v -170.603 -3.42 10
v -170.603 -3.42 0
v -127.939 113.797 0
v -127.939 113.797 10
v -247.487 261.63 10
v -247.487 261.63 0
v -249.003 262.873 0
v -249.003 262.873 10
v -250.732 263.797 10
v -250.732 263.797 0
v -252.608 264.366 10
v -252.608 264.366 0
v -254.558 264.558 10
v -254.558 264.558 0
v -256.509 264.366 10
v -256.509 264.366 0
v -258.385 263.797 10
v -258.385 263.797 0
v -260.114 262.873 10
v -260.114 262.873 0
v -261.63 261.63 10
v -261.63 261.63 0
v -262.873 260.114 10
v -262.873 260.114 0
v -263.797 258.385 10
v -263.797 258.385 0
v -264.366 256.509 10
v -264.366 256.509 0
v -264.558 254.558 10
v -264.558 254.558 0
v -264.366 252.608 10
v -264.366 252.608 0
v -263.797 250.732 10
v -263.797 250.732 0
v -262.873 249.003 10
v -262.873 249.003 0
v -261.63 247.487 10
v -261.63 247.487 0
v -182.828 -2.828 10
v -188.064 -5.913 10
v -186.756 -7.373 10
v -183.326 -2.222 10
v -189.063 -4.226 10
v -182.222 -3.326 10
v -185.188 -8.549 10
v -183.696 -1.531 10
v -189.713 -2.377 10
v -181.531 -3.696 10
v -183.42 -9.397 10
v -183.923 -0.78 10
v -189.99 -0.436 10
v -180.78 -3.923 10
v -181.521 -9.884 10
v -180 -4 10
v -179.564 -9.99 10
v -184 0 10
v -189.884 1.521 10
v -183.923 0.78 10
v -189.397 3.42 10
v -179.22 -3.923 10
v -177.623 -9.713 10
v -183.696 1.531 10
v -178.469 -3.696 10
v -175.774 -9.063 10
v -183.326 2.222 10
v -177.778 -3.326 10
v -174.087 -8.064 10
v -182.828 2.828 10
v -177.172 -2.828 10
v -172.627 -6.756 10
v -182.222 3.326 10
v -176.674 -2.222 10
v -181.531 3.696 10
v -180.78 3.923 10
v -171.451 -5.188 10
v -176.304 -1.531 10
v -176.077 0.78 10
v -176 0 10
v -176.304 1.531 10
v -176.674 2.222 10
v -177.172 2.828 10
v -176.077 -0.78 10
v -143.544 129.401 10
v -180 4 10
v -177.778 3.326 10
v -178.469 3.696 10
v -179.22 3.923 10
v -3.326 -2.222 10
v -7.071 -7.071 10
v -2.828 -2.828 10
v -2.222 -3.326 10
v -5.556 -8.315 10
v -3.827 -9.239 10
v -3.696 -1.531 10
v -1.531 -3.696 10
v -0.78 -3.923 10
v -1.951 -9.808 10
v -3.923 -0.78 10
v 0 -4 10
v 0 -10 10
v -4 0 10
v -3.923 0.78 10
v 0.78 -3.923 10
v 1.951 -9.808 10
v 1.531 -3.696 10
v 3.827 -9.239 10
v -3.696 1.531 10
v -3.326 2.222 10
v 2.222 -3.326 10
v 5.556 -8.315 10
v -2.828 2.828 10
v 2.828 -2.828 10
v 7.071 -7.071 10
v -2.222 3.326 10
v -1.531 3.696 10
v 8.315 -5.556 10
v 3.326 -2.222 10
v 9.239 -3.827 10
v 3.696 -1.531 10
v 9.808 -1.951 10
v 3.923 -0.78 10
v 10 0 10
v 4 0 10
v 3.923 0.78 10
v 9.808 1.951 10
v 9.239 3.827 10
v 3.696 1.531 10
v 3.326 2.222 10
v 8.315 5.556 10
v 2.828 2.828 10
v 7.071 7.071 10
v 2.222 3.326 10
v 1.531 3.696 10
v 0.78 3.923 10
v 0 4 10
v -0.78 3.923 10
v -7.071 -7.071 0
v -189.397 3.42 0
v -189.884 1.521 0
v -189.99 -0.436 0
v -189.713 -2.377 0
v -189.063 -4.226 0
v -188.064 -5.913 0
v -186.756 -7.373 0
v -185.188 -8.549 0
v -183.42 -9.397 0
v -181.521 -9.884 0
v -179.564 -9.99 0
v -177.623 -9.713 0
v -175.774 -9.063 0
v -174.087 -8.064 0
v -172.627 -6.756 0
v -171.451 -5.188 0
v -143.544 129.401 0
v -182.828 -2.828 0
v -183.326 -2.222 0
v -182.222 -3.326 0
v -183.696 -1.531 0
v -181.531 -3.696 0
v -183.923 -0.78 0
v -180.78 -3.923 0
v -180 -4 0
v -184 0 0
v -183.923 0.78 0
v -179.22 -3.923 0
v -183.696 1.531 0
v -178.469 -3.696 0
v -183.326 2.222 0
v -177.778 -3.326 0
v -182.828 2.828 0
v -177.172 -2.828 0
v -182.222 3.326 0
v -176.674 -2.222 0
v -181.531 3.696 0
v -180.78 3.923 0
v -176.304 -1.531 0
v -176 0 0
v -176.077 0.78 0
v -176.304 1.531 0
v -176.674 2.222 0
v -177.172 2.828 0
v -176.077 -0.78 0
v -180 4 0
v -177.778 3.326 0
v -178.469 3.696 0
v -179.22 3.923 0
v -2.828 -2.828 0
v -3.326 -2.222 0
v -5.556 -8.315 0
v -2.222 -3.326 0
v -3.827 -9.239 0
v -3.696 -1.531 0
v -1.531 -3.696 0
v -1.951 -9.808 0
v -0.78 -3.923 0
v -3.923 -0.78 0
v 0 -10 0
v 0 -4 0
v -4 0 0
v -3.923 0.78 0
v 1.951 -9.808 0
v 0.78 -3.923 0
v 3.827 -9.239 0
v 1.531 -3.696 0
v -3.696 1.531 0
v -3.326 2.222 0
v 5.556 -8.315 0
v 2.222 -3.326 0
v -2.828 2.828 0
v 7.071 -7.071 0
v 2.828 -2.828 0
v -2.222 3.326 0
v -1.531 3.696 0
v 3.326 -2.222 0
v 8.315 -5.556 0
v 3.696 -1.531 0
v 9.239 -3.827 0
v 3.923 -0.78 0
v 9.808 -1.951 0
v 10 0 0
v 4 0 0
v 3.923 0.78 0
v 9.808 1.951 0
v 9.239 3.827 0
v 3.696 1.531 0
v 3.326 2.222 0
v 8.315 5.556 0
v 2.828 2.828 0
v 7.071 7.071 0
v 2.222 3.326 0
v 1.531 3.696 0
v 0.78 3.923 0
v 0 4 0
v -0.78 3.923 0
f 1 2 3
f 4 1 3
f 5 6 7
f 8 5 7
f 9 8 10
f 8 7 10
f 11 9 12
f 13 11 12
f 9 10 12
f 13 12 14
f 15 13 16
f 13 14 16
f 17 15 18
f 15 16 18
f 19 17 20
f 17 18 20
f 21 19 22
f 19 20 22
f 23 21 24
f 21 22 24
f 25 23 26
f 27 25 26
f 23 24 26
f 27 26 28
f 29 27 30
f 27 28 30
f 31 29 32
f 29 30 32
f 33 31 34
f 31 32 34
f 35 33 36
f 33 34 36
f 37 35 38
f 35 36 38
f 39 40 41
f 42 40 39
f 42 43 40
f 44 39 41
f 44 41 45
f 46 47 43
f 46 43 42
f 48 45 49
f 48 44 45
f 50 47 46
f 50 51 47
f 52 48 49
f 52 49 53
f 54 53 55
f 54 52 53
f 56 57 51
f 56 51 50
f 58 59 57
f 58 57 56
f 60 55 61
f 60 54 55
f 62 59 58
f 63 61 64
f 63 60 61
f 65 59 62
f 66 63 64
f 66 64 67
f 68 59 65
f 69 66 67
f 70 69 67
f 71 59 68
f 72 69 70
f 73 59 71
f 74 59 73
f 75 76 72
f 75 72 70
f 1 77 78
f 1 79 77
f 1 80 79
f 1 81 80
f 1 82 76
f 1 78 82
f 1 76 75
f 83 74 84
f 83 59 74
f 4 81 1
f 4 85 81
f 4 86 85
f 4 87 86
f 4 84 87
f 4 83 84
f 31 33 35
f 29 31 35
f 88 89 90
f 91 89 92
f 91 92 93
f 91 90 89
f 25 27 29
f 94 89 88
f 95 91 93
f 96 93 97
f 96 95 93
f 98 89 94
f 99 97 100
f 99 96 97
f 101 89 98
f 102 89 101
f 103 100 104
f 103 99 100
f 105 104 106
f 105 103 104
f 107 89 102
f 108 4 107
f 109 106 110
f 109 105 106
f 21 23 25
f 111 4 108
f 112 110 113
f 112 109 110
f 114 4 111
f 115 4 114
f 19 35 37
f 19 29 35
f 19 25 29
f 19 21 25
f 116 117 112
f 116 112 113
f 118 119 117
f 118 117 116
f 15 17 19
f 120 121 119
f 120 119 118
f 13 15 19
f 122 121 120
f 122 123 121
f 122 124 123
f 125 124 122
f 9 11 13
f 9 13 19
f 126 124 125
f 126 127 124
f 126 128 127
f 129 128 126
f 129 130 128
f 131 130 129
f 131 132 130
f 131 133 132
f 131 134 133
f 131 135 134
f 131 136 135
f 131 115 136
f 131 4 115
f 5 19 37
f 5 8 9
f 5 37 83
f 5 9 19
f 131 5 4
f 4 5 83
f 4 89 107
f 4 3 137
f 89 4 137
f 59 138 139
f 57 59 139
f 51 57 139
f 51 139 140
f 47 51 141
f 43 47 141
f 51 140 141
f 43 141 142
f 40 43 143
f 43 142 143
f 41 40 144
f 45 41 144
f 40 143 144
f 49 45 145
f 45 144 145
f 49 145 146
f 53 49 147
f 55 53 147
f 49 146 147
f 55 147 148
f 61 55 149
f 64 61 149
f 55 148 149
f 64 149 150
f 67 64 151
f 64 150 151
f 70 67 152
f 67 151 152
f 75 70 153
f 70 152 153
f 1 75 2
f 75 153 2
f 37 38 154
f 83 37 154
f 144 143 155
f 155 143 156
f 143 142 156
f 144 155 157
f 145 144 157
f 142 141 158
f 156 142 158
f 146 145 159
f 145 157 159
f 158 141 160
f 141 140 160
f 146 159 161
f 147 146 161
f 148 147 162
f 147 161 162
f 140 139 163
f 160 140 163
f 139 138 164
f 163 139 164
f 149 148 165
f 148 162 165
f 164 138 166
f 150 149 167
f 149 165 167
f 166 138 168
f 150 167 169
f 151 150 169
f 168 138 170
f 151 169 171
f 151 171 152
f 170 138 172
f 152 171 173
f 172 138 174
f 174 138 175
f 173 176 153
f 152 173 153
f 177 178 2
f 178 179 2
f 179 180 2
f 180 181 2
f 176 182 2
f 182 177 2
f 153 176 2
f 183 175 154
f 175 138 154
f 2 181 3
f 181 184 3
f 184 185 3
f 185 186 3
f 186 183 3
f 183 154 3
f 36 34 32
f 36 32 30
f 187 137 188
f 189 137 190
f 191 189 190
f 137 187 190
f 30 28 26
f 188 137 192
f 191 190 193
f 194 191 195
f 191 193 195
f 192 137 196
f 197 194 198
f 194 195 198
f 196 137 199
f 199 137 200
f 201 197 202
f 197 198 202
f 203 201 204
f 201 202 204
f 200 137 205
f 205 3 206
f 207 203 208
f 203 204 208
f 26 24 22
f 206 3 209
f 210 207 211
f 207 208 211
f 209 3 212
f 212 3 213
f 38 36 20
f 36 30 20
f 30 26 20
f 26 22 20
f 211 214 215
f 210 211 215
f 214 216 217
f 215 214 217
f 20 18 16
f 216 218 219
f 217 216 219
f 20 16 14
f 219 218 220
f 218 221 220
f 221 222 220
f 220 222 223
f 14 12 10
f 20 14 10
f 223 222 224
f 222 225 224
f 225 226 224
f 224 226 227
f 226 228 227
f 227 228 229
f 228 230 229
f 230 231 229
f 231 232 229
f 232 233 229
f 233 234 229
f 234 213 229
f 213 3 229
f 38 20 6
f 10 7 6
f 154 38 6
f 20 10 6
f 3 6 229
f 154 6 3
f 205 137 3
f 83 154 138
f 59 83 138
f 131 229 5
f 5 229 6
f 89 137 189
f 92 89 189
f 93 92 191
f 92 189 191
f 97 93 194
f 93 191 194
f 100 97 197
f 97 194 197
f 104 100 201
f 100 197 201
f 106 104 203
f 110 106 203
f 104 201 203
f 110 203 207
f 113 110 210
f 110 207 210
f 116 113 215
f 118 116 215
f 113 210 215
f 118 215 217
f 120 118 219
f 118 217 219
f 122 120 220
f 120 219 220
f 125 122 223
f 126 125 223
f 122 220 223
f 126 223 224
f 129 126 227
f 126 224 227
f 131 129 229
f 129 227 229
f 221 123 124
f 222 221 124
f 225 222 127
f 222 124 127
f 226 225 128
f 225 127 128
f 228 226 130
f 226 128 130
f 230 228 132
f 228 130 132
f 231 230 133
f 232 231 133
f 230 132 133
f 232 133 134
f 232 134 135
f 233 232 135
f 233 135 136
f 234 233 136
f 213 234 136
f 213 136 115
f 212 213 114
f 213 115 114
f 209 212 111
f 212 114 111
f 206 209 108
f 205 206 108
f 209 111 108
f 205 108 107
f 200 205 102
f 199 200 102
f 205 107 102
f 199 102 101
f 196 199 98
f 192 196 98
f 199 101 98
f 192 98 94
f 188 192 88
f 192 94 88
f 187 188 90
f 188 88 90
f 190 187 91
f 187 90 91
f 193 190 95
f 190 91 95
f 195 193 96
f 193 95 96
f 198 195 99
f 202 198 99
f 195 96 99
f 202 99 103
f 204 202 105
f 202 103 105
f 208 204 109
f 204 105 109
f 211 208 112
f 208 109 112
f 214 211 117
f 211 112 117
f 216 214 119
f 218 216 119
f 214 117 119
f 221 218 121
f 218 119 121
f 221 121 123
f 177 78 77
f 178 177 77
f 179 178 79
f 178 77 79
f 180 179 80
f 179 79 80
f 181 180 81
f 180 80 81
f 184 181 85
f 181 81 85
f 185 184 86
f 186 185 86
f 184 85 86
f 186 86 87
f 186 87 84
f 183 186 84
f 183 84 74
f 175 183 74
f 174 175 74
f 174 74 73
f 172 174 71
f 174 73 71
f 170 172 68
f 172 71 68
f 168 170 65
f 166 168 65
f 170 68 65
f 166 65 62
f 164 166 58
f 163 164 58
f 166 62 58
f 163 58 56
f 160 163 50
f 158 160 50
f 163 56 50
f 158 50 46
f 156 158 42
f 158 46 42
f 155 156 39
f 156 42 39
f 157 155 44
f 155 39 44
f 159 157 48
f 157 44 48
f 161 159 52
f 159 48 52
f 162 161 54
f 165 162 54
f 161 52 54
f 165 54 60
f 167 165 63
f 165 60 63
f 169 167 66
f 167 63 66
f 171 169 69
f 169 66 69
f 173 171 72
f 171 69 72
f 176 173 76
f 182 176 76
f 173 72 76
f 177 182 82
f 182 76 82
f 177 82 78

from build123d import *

# Parameters (mm, degrees)
BOSS_EXTRUDE1_DEPTH = 10
SKETCH2_R           = 4
CUT_EXTRUDE1_DEPTH  = 10


# Read off the part's stored shape, not the designer's step: Boss-Extrude1
with BuildPart() as part:
    # Boss-Extrude1 outline → Boss-Extrude1 (new body)
    with BuildSketch(Plane.XY):
        with BuildLine():
            ThreePointArc((-7.071067812, -7.071067812), (7.071067812, -7.071067812), (7.071067812, 7.071067812))
            Line((7.071067812, 7.071067812), (-247.487373415, 261.629509039))
            ThreePointArc((-247.487373415, 261.629509039), (-261.629509039, 261.629509039), (-261.629509039, 247.487373415))
            Line((-261.629509039, 247.487373415), (-143.543524061, 129.401388437))
            Line((-143.543524061, 129.401388437), (-189.396926208, 3.420201433))
            ThreePointArc((-189.396926208, 3.420201433), (-183.420201433, -9.396926208), (-170.603073792, -3.420201433))
            Line((-170.603073792, -3.420201433), (-127.939403887, 113.797268263))
            Line((-127.939403887, 113.797268263), (-7.071067812, -7.071067812))
        make_face()
    extrude(amount=BOSS_EXTRUDE1_DEPTH)

    # Sketch2 → Cut-Extrude1 (cut)
    with BuildSketch(Plane.XY.offset(10)):
        Circle(SKETCH2_R)
        with Locations((-180, 0)):
            Circle(SKETCH2_R)
    extrude(amount=-CUT_EXTRUDE1_DEPTH, mode=Mode.SUBTRACT)


solid = part.part
